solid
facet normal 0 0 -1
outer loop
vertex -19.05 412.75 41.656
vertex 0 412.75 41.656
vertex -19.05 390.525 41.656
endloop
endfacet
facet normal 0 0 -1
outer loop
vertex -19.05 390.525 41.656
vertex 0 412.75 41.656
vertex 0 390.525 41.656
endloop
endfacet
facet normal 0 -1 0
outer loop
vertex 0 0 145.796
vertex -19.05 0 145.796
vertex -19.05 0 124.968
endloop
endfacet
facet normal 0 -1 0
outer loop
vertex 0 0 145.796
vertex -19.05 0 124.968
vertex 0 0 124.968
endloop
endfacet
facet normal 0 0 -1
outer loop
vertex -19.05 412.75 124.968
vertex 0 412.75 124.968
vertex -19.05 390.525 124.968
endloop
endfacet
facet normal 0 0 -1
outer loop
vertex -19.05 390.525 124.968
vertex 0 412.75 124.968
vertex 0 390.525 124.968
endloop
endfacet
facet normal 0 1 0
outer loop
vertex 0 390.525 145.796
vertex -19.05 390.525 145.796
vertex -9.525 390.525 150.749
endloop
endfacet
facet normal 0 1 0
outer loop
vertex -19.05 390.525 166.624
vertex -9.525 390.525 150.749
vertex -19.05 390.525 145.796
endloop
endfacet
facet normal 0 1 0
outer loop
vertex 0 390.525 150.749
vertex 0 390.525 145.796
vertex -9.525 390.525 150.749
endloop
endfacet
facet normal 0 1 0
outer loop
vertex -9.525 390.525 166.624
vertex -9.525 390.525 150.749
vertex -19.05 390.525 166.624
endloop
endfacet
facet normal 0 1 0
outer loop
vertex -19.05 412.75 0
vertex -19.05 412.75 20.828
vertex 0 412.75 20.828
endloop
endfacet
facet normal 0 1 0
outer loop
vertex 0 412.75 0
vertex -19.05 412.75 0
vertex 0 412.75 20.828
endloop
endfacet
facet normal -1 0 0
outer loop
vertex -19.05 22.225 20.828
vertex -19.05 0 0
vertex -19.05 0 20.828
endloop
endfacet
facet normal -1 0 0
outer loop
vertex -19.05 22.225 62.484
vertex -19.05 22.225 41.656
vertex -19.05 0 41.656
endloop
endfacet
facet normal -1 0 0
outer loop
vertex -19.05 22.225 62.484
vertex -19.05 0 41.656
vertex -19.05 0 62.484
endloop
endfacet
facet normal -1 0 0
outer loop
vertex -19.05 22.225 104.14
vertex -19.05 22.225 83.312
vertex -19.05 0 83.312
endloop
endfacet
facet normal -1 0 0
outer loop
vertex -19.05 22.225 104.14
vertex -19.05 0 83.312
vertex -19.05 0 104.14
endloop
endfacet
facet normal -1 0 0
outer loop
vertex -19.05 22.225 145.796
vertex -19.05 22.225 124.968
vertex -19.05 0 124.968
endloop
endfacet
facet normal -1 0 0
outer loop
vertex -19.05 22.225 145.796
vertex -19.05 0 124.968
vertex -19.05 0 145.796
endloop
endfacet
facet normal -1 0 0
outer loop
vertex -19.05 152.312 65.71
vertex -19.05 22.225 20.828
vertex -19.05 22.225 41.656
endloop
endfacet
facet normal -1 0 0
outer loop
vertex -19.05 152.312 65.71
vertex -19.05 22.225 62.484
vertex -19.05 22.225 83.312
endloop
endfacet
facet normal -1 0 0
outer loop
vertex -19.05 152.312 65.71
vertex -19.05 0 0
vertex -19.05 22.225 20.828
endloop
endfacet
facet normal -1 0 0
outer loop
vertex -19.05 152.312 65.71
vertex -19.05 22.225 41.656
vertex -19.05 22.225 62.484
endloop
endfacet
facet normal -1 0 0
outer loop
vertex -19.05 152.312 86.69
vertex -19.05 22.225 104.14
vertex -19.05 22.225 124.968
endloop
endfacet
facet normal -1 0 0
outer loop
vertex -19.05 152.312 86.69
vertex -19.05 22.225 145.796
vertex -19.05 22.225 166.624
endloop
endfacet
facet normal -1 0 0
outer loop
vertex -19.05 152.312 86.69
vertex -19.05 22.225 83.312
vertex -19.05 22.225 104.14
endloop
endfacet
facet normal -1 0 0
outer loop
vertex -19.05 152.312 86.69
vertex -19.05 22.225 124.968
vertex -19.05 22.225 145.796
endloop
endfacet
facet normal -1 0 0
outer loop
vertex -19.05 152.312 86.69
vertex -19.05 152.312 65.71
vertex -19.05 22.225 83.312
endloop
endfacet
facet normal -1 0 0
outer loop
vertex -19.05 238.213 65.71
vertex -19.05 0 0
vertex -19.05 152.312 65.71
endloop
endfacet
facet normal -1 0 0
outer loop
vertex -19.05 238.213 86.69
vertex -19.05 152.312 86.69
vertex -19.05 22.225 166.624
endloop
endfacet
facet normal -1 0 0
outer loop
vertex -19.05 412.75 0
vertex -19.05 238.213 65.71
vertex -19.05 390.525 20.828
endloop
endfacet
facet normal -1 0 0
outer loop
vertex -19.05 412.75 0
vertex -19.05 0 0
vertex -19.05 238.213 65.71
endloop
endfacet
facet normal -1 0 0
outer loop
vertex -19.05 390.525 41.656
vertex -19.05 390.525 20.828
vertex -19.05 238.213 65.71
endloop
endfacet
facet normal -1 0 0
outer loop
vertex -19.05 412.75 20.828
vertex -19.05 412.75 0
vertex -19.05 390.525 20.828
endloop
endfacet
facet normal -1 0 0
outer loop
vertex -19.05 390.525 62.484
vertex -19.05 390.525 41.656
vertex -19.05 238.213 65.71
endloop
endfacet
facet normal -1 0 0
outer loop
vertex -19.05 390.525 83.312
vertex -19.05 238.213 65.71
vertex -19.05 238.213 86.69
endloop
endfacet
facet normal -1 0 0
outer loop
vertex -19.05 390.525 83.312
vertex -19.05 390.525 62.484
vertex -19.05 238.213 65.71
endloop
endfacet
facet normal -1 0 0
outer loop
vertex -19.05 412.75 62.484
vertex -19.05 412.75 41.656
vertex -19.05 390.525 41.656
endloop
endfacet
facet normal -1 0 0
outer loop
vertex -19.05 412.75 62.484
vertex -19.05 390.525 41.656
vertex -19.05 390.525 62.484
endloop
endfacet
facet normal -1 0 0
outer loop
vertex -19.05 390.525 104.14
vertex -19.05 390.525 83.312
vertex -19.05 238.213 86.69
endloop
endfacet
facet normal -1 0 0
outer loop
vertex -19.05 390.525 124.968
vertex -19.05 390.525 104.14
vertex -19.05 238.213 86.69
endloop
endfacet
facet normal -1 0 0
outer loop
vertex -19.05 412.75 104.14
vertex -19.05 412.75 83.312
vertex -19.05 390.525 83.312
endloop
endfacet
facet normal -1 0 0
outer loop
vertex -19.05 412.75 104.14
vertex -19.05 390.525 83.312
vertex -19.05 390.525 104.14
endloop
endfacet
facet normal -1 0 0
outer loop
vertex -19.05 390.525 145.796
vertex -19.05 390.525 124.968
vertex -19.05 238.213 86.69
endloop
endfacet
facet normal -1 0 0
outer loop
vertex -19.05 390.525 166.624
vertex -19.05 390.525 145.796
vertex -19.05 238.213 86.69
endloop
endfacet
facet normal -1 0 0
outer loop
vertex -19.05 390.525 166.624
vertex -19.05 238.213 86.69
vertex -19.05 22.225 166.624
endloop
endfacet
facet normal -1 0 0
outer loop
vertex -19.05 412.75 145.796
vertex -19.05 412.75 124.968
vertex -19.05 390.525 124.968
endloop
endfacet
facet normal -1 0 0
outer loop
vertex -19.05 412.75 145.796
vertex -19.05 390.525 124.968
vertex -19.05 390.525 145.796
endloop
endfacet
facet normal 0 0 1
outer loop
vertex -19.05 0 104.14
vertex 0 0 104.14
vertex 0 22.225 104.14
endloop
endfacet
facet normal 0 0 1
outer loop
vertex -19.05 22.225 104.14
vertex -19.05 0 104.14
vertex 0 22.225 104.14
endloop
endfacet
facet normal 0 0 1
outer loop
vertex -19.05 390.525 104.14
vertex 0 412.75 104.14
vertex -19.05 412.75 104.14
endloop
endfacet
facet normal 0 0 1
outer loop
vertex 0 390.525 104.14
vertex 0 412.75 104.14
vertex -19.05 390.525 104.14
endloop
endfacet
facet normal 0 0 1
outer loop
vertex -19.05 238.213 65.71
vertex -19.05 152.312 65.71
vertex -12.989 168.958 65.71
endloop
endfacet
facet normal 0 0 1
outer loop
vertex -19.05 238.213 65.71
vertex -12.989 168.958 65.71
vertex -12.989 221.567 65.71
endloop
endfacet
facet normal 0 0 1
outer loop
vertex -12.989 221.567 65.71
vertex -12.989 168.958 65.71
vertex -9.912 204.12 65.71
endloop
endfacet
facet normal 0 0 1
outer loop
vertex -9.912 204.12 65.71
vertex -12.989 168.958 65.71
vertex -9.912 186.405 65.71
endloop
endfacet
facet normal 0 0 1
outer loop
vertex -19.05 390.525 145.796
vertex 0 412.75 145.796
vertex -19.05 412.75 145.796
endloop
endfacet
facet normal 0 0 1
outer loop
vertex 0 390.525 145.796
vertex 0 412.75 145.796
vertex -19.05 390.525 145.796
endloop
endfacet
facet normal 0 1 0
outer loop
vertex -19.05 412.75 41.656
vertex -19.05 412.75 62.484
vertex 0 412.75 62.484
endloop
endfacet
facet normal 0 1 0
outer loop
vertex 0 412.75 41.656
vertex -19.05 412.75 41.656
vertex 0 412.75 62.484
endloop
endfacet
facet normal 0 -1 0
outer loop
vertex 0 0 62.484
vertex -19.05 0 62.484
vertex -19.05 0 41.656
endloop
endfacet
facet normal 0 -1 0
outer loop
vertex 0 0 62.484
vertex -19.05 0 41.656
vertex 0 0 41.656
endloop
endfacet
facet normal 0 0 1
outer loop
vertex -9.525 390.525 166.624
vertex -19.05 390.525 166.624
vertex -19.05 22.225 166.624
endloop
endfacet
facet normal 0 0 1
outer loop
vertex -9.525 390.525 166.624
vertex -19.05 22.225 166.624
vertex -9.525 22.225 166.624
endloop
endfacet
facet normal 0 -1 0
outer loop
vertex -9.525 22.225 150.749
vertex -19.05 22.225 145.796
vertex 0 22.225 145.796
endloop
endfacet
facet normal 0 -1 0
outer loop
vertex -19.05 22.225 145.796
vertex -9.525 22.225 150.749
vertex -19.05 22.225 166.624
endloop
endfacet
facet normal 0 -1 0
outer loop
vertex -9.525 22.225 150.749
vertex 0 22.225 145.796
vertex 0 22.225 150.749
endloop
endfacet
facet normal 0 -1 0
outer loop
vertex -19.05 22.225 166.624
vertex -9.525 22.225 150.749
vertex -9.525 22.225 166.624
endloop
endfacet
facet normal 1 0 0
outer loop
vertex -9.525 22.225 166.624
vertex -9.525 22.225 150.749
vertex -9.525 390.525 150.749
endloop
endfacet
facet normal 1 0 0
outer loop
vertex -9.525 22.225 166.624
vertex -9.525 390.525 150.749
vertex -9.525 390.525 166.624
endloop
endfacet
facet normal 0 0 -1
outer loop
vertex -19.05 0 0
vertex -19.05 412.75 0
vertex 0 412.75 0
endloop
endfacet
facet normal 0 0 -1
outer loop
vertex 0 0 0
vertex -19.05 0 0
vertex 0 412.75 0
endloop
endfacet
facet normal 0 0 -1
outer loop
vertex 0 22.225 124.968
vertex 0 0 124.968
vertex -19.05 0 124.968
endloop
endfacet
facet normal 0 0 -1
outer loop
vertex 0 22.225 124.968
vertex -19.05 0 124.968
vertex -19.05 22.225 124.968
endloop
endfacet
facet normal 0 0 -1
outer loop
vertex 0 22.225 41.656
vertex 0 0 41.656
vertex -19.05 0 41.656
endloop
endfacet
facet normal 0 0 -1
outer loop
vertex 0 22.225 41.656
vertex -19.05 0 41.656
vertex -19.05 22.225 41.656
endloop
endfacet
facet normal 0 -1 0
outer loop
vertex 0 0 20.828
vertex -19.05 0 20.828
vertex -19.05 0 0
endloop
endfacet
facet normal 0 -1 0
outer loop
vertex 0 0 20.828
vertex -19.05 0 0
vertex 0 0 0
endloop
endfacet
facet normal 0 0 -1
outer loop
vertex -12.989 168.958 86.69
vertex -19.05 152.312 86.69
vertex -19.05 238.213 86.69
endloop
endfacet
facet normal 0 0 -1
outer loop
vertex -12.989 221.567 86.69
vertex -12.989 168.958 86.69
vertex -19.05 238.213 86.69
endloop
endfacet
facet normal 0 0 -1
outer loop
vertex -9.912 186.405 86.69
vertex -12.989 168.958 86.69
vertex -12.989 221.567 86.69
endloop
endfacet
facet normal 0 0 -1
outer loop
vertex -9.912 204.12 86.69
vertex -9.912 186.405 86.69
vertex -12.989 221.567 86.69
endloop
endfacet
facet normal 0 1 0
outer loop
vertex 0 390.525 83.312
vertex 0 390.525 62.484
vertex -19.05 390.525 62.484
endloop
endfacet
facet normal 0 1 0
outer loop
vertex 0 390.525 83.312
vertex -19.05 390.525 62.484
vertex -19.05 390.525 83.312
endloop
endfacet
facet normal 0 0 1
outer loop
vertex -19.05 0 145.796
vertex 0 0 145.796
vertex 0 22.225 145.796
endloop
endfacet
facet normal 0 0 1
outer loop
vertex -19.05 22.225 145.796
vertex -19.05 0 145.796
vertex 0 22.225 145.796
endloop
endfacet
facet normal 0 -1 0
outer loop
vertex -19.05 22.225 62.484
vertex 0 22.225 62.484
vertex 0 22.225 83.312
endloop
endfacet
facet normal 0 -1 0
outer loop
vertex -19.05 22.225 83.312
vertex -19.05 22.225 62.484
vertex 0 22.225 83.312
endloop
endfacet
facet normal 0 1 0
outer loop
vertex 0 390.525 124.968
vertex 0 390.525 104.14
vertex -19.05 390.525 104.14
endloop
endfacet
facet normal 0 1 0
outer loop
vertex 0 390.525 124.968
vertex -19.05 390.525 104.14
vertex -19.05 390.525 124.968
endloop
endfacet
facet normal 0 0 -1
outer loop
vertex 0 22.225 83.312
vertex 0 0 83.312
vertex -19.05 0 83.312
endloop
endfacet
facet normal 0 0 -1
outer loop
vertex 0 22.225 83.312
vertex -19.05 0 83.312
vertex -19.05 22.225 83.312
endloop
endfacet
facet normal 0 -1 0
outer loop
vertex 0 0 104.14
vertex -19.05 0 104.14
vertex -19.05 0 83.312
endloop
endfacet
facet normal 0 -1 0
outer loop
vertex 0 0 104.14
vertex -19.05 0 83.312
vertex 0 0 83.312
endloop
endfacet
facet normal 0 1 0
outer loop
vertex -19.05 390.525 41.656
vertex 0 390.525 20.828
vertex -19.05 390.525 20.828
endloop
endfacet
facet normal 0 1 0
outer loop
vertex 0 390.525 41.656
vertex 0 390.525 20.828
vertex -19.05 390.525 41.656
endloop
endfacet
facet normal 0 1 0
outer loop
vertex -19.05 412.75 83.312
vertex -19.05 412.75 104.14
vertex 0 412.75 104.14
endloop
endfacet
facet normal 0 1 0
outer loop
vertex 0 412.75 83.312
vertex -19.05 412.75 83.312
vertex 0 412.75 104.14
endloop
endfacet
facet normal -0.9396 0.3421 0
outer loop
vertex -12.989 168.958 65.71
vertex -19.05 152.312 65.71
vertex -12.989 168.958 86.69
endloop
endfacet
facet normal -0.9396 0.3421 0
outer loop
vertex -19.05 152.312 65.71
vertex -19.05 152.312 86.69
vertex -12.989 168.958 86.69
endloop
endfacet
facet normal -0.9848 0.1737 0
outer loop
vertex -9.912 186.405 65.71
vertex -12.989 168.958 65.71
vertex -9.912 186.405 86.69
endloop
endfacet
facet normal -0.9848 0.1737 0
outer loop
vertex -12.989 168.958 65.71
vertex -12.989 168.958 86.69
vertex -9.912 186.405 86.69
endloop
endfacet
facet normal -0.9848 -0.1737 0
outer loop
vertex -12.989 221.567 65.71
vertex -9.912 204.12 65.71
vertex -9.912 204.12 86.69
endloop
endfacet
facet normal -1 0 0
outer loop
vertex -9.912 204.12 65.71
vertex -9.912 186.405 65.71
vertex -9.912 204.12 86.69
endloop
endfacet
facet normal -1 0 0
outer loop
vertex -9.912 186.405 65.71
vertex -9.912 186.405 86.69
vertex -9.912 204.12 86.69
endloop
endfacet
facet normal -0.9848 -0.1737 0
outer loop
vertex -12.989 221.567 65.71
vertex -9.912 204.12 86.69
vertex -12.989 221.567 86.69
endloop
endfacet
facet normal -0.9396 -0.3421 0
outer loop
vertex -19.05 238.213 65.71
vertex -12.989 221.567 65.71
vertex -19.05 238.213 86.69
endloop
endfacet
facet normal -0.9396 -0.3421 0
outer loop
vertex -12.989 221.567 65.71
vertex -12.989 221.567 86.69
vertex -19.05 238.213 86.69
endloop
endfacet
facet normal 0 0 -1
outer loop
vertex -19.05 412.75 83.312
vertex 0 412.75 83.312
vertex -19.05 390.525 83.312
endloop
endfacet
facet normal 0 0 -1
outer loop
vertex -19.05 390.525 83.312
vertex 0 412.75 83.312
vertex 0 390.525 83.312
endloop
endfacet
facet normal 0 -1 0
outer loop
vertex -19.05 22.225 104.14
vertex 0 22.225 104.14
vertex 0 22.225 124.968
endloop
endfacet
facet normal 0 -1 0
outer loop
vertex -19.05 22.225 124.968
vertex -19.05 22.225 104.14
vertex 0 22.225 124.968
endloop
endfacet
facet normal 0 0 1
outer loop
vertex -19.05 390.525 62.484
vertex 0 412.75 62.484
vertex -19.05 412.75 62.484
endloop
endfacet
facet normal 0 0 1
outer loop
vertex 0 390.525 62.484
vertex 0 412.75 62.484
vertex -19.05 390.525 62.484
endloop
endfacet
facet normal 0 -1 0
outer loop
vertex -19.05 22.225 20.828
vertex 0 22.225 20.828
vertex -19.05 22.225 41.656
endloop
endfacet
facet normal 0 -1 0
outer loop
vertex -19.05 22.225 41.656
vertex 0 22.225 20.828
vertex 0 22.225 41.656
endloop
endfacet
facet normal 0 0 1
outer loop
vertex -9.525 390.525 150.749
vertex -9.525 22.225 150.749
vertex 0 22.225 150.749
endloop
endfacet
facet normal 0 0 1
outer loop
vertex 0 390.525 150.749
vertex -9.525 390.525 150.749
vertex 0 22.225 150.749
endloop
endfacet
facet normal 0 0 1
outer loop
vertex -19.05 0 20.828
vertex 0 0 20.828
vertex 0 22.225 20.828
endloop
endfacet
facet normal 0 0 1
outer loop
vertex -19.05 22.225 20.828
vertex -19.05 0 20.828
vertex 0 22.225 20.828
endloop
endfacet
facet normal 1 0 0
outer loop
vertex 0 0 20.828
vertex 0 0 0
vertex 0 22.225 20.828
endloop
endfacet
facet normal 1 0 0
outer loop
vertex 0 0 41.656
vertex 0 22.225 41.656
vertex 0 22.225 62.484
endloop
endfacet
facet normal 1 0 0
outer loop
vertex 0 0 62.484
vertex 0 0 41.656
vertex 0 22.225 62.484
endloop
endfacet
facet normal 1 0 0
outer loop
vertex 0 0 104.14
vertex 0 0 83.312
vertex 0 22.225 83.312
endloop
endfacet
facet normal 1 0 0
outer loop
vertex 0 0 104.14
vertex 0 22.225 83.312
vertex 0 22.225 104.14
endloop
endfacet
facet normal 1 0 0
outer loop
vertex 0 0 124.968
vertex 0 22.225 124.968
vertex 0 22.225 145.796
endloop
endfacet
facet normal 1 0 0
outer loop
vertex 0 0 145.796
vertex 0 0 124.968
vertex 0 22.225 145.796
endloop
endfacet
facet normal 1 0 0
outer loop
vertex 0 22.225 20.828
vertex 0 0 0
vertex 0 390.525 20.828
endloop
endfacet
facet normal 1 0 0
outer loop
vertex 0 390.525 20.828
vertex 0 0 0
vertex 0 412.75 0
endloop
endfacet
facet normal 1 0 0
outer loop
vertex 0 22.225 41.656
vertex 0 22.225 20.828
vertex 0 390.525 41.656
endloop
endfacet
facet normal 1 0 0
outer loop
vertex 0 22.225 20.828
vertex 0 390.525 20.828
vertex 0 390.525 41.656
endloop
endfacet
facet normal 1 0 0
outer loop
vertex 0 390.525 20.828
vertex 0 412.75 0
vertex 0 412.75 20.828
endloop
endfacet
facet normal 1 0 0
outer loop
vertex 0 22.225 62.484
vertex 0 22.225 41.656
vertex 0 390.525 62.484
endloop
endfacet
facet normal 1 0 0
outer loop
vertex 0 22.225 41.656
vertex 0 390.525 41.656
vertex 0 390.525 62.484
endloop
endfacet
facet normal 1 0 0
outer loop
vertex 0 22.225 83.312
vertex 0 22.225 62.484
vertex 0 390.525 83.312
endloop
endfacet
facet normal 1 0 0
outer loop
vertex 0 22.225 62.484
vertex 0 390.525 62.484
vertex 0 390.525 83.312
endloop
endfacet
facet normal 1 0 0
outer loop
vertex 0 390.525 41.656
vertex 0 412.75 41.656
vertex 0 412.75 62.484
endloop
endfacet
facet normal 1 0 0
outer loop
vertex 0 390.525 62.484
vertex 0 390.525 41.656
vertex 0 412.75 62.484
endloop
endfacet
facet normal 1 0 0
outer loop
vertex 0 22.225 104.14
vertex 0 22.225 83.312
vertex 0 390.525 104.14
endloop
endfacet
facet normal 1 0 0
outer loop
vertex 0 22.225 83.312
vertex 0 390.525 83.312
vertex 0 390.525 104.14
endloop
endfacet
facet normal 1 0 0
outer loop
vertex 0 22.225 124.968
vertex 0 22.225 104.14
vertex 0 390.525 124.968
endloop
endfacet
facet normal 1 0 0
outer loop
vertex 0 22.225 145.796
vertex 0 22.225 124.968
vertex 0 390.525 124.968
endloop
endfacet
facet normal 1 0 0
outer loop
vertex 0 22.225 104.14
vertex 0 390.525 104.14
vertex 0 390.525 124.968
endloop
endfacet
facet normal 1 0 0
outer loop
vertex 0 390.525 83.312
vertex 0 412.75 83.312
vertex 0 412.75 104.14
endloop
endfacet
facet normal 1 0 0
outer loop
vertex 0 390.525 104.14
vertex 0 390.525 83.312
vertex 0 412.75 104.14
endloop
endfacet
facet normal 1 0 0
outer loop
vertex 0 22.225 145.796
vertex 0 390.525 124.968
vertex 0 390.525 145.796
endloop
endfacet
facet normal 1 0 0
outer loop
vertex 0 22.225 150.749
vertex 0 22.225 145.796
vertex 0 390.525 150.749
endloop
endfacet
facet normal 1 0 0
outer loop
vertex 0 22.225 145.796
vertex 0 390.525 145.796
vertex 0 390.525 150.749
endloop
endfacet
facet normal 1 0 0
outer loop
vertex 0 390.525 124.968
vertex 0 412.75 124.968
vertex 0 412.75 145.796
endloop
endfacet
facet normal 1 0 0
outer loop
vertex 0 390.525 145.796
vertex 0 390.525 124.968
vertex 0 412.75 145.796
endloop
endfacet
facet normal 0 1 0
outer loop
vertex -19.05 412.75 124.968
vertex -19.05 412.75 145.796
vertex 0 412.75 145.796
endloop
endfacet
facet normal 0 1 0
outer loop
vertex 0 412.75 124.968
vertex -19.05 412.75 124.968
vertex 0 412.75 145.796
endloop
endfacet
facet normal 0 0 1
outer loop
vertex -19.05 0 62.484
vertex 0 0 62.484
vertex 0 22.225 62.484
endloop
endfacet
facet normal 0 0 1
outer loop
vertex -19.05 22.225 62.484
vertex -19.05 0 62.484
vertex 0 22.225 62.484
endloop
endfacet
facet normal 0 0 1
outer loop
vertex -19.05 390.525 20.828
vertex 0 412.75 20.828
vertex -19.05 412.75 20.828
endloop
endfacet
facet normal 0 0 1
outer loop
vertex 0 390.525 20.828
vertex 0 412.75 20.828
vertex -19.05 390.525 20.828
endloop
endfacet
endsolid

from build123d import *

# Parameters (mm, degrees)
F0_W     = 19.05
F0_H     = 166.624
F1_DEPTH = 206.375
F2_W     = 22.225
F2_H     = 20.828
F3_DEPTH = 19.051
F5_W     = 9.525
F5_H     = 15.875
F6_DEPTH = 412.751
F8_R     = 101.6
F9_DEPTH = 10.4902


with BuildPart() as f1:
    # F0 (on Front) → F1 (new body)
    with BuildSketch(Plane.XZ):
        with Locations((-9.525, 83.312)):
            Rectangle(F0_W, F0_H)
    extrude(amount=-F1_DEPTH)

    # F2 (on Right) → F3 (cut, through all)
    with BuildSketch(Plane.YZ):
        with Locations((11.1125, 31.242)):
            Rectangle(F2_W, F2_H)
        with Locations((11.1125, 72.898)):
            Rectangle(F2_W, F2_H)
        with Locations((11.1125, 114.554)):
            Rectangle(F2_W, F2_H)
        with Locations((11.1125, 156.21)):
            Rectangle(F2_W, F2_H)
    extrude(amount=-F3_DEPTH, mode=Mode.SUBTRACT)

    # F4: F1 across face


with BuildPart() as f1_1:
    add(f1.part)
    add(f1.part.mirror(Plane(origin=(-9.525, 206.375, 83.312), x_dir=(1, 0, 0), z_dir=(0, 1, 0))))

    # F5 (on Front) → F6 (cut, through all)
    with BuildSketch(Plane.XZ):
        with Locations((-4.7625, 158.6865)):
            Rectangle(F5_W, F5_H)
    extrude(amount=-F6_DEPTH, mode=Mode.SUBTRACT)

    # F8 (on offset) → F9 (cut, symmetric)
    with BuildSketch(Plane.XY.offset(76.2)):
        with Locations((-111.125, 195.2625)):
            Circle(F8_R)
    extrude(amount=F9_DEPTH, both=True, mode=Mode.SUBTRACT)


solid = f1_1.part
